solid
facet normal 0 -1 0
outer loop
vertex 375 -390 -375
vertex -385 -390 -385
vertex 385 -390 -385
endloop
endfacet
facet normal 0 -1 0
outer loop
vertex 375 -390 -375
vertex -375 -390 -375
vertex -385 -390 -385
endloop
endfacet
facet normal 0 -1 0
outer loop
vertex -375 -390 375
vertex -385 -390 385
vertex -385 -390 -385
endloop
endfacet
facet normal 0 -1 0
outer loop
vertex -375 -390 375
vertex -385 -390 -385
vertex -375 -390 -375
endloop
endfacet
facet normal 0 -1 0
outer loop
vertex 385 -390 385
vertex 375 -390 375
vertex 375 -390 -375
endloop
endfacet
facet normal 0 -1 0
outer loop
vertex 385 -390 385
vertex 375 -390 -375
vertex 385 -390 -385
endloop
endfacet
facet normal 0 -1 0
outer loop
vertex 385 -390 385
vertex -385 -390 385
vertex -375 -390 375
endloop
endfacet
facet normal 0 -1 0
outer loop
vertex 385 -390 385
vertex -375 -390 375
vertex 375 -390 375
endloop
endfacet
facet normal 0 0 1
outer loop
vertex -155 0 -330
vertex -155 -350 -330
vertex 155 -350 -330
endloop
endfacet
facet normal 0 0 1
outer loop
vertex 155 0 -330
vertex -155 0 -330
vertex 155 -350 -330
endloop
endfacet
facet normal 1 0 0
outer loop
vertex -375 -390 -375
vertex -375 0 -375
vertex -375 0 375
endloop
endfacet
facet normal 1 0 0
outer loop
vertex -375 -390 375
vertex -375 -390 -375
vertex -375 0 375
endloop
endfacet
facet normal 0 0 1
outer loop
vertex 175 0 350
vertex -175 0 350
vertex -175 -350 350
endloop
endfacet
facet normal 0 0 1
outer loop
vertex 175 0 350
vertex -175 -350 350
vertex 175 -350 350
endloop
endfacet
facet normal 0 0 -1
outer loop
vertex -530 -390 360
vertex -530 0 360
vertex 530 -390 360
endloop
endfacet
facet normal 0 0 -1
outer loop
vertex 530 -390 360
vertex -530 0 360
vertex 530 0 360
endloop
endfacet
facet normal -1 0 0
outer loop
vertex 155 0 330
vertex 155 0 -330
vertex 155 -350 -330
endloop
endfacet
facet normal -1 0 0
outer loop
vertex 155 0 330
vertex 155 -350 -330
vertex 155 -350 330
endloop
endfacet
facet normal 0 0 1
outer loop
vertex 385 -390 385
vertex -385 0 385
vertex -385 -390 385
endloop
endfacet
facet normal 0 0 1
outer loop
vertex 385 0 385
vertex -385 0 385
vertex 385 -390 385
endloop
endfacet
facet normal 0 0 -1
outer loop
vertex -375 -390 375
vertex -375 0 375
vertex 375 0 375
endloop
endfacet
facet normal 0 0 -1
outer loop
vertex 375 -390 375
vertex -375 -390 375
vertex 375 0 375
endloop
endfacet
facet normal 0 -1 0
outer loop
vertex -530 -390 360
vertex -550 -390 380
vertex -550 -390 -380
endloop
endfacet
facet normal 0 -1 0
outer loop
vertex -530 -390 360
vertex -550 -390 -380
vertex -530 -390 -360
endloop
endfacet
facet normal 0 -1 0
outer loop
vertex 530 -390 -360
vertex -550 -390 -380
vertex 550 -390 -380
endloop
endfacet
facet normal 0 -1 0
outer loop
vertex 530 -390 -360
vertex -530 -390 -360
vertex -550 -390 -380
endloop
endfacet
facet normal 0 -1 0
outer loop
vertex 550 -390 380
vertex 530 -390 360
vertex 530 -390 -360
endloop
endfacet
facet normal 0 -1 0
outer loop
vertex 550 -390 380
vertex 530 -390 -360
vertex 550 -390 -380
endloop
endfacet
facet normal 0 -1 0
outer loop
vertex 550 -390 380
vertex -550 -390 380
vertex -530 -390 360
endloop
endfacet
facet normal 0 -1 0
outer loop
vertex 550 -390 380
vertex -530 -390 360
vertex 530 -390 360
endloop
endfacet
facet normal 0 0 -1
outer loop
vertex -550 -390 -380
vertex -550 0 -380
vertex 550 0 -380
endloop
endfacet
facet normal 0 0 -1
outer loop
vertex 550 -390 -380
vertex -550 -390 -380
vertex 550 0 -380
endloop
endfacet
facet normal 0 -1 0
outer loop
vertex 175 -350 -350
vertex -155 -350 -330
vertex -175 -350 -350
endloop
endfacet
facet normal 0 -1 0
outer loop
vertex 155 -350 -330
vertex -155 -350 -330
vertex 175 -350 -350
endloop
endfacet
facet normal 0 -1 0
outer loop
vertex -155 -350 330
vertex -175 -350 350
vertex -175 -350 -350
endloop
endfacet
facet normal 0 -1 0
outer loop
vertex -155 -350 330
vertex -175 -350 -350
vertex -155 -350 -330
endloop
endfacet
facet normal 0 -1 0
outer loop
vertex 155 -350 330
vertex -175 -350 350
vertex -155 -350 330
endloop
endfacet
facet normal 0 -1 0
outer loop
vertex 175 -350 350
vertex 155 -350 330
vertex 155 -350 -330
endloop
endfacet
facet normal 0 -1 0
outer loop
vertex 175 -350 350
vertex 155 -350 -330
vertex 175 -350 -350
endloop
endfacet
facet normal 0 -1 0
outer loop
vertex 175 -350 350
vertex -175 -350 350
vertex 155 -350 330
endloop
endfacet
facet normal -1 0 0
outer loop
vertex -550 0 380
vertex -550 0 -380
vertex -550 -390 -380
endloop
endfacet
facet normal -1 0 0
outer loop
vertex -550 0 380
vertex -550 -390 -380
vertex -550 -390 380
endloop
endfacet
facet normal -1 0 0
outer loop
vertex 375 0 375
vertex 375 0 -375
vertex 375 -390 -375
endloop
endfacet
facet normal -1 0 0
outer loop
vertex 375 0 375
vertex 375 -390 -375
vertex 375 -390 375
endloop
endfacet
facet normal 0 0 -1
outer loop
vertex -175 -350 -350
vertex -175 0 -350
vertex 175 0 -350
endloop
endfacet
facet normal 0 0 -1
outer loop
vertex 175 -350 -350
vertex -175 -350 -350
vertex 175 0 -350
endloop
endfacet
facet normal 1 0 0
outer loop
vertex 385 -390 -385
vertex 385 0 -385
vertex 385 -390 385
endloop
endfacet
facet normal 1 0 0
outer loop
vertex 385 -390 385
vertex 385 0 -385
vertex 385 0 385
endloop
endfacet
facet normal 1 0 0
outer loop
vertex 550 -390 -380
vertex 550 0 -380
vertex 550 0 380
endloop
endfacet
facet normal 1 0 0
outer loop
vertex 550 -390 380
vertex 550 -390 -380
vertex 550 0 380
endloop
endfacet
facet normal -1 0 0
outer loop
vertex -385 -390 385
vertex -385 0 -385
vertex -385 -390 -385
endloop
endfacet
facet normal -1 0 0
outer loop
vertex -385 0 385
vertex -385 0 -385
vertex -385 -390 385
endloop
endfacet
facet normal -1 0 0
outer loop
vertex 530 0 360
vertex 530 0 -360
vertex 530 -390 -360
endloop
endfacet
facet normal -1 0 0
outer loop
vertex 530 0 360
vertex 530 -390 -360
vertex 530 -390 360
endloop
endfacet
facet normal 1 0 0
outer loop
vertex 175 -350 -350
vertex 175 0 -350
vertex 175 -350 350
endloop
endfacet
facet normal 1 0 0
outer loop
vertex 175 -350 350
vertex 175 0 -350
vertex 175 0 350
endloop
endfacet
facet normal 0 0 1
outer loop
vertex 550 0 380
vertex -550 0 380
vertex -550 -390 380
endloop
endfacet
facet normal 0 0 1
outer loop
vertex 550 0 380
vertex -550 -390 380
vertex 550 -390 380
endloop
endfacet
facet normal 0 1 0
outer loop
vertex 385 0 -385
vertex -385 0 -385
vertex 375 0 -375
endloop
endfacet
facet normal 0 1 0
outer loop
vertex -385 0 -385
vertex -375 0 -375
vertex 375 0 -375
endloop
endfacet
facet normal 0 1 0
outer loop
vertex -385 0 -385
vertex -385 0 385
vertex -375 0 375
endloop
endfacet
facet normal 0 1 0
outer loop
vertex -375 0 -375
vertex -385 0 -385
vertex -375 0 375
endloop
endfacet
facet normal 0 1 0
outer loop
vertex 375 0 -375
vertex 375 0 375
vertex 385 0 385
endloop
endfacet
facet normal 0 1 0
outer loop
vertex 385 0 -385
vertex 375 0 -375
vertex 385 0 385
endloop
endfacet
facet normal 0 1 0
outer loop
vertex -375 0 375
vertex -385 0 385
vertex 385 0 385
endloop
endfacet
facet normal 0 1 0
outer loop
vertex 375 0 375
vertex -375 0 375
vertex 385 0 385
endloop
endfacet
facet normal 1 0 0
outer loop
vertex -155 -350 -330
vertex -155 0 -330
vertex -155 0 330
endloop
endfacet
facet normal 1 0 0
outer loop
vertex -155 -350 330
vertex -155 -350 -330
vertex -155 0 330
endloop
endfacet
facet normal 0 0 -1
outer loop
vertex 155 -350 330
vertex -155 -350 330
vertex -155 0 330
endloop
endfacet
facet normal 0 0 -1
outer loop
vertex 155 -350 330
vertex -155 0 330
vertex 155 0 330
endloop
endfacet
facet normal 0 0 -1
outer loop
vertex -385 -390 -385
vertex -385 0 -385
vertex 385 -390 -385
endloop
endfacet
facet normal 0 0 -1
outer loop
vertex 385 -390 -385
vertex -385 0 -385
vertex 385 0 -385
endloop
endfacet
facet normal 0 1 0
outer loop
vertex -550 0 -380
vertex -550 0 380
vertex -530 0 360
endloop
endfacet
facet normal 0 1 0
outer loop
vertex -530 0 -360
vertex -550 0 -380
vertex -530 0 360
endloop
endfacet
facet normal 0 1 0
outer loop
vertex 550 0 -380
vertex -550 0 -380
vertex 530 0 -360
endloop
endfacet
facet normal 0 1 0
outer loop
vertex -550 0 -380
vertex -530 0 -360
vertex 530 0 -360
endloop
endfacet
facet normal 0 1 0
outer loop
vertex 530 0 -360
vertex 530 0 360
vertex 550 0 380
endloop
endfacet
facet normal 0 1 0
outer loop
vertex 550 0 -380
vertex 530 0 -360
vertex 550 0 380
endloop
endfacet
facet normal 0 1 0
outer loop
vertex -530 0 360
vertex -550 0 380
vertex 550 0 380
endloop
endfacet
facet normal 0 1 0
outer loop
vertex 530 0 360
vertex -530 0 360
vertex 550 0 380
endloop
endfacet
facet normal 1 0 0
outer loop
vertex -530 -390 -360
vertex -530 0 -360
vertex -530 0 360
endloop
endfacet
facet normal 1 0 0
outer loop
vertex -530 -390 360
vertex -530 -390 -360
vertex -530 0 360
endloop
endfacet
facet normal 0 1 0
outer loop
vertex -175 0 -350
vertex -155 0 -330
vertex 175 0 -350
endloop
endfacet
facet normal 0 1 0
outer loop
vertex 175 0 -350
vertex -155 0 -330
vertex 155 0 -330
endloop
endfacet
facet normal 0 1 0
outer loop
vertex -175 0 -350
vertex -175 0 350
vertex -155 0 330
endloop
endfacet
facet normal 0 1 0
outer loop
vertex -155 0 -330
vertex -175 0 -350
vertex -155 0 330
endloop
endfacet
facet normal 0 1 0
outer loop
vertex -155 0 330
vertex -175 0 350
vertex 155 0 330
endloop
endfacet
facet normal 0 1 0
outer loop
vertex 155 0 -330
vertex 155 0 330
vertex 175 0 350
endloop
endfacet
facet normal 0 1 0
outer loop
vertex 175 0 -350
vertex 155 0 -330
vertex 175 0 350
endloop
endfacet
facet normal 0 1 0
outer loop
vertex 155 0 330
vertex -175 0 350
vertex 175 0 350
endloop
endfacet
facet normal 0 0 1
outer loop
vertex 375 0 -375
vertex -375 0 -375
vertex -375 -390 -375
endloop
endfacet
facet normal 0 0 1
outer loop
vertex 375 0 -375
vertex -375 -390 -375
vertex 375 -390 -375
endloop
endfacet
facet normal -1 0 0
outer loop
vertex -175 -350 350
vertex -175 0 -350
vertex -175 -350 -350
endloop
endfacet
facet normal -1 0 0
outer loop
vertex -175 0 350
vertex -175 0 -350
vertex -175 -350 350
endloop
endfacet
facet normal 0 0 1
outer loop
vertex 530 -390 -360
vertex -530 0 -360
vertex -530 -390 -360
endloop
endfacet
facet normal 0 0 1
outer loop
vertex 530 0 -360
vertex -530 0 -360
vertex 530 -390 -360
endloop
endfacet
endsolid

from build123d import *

# Parameters (mm, degrees)
F0_W     = 770
F0_H     = 770
F0_W_2   = 750
F0_H_2   = 750
F1_DEPTH = 390
F2_W     = 1100
F2_H     = 760
F2_W_2   = 1060
F2_H_2   = 720
F3_DEPTH = 390
F4_W     = 350
F4_H     = 700
F4_W_2   = 310
F4_H_2   = 660
F5_DEPTH = 350


with BuildPart() as f1:
    # F0 (on Front) → F1 (new body)
    with BuildSketch(Plane.XZ):
        Rectangle(F0_W, F0_H)
        Rectangle(F0_W_2, F0_H_2, mode=Mode.SUBTRACT)
    extrude(amount=F1_DEPTH)


with BuildPart() as f3:
    # F2 (on Front) → F3 (new body)
    with BuildSketch(Plane.XZ):
        Rectangle(F2_W, F2_H)
        Rectangle(F2_W_2, F2_H_2, mode=Mode.SUBTRACT)
    extrude(amount=F3_DEPTH)


with BuildPart() as f5:
    # F4 (on Front) → F5 (new body)
    with BuildSketch(Plane.XZ):
        Rectangle(F4_W, F4_H)
        Rectangle(F4_W_2, F4_H_2, mode=Mode.SUBTRACT)
    extrude(amount=F5_DEPTH)


solid = Compound([f1.part, f3.part, f5.part])
